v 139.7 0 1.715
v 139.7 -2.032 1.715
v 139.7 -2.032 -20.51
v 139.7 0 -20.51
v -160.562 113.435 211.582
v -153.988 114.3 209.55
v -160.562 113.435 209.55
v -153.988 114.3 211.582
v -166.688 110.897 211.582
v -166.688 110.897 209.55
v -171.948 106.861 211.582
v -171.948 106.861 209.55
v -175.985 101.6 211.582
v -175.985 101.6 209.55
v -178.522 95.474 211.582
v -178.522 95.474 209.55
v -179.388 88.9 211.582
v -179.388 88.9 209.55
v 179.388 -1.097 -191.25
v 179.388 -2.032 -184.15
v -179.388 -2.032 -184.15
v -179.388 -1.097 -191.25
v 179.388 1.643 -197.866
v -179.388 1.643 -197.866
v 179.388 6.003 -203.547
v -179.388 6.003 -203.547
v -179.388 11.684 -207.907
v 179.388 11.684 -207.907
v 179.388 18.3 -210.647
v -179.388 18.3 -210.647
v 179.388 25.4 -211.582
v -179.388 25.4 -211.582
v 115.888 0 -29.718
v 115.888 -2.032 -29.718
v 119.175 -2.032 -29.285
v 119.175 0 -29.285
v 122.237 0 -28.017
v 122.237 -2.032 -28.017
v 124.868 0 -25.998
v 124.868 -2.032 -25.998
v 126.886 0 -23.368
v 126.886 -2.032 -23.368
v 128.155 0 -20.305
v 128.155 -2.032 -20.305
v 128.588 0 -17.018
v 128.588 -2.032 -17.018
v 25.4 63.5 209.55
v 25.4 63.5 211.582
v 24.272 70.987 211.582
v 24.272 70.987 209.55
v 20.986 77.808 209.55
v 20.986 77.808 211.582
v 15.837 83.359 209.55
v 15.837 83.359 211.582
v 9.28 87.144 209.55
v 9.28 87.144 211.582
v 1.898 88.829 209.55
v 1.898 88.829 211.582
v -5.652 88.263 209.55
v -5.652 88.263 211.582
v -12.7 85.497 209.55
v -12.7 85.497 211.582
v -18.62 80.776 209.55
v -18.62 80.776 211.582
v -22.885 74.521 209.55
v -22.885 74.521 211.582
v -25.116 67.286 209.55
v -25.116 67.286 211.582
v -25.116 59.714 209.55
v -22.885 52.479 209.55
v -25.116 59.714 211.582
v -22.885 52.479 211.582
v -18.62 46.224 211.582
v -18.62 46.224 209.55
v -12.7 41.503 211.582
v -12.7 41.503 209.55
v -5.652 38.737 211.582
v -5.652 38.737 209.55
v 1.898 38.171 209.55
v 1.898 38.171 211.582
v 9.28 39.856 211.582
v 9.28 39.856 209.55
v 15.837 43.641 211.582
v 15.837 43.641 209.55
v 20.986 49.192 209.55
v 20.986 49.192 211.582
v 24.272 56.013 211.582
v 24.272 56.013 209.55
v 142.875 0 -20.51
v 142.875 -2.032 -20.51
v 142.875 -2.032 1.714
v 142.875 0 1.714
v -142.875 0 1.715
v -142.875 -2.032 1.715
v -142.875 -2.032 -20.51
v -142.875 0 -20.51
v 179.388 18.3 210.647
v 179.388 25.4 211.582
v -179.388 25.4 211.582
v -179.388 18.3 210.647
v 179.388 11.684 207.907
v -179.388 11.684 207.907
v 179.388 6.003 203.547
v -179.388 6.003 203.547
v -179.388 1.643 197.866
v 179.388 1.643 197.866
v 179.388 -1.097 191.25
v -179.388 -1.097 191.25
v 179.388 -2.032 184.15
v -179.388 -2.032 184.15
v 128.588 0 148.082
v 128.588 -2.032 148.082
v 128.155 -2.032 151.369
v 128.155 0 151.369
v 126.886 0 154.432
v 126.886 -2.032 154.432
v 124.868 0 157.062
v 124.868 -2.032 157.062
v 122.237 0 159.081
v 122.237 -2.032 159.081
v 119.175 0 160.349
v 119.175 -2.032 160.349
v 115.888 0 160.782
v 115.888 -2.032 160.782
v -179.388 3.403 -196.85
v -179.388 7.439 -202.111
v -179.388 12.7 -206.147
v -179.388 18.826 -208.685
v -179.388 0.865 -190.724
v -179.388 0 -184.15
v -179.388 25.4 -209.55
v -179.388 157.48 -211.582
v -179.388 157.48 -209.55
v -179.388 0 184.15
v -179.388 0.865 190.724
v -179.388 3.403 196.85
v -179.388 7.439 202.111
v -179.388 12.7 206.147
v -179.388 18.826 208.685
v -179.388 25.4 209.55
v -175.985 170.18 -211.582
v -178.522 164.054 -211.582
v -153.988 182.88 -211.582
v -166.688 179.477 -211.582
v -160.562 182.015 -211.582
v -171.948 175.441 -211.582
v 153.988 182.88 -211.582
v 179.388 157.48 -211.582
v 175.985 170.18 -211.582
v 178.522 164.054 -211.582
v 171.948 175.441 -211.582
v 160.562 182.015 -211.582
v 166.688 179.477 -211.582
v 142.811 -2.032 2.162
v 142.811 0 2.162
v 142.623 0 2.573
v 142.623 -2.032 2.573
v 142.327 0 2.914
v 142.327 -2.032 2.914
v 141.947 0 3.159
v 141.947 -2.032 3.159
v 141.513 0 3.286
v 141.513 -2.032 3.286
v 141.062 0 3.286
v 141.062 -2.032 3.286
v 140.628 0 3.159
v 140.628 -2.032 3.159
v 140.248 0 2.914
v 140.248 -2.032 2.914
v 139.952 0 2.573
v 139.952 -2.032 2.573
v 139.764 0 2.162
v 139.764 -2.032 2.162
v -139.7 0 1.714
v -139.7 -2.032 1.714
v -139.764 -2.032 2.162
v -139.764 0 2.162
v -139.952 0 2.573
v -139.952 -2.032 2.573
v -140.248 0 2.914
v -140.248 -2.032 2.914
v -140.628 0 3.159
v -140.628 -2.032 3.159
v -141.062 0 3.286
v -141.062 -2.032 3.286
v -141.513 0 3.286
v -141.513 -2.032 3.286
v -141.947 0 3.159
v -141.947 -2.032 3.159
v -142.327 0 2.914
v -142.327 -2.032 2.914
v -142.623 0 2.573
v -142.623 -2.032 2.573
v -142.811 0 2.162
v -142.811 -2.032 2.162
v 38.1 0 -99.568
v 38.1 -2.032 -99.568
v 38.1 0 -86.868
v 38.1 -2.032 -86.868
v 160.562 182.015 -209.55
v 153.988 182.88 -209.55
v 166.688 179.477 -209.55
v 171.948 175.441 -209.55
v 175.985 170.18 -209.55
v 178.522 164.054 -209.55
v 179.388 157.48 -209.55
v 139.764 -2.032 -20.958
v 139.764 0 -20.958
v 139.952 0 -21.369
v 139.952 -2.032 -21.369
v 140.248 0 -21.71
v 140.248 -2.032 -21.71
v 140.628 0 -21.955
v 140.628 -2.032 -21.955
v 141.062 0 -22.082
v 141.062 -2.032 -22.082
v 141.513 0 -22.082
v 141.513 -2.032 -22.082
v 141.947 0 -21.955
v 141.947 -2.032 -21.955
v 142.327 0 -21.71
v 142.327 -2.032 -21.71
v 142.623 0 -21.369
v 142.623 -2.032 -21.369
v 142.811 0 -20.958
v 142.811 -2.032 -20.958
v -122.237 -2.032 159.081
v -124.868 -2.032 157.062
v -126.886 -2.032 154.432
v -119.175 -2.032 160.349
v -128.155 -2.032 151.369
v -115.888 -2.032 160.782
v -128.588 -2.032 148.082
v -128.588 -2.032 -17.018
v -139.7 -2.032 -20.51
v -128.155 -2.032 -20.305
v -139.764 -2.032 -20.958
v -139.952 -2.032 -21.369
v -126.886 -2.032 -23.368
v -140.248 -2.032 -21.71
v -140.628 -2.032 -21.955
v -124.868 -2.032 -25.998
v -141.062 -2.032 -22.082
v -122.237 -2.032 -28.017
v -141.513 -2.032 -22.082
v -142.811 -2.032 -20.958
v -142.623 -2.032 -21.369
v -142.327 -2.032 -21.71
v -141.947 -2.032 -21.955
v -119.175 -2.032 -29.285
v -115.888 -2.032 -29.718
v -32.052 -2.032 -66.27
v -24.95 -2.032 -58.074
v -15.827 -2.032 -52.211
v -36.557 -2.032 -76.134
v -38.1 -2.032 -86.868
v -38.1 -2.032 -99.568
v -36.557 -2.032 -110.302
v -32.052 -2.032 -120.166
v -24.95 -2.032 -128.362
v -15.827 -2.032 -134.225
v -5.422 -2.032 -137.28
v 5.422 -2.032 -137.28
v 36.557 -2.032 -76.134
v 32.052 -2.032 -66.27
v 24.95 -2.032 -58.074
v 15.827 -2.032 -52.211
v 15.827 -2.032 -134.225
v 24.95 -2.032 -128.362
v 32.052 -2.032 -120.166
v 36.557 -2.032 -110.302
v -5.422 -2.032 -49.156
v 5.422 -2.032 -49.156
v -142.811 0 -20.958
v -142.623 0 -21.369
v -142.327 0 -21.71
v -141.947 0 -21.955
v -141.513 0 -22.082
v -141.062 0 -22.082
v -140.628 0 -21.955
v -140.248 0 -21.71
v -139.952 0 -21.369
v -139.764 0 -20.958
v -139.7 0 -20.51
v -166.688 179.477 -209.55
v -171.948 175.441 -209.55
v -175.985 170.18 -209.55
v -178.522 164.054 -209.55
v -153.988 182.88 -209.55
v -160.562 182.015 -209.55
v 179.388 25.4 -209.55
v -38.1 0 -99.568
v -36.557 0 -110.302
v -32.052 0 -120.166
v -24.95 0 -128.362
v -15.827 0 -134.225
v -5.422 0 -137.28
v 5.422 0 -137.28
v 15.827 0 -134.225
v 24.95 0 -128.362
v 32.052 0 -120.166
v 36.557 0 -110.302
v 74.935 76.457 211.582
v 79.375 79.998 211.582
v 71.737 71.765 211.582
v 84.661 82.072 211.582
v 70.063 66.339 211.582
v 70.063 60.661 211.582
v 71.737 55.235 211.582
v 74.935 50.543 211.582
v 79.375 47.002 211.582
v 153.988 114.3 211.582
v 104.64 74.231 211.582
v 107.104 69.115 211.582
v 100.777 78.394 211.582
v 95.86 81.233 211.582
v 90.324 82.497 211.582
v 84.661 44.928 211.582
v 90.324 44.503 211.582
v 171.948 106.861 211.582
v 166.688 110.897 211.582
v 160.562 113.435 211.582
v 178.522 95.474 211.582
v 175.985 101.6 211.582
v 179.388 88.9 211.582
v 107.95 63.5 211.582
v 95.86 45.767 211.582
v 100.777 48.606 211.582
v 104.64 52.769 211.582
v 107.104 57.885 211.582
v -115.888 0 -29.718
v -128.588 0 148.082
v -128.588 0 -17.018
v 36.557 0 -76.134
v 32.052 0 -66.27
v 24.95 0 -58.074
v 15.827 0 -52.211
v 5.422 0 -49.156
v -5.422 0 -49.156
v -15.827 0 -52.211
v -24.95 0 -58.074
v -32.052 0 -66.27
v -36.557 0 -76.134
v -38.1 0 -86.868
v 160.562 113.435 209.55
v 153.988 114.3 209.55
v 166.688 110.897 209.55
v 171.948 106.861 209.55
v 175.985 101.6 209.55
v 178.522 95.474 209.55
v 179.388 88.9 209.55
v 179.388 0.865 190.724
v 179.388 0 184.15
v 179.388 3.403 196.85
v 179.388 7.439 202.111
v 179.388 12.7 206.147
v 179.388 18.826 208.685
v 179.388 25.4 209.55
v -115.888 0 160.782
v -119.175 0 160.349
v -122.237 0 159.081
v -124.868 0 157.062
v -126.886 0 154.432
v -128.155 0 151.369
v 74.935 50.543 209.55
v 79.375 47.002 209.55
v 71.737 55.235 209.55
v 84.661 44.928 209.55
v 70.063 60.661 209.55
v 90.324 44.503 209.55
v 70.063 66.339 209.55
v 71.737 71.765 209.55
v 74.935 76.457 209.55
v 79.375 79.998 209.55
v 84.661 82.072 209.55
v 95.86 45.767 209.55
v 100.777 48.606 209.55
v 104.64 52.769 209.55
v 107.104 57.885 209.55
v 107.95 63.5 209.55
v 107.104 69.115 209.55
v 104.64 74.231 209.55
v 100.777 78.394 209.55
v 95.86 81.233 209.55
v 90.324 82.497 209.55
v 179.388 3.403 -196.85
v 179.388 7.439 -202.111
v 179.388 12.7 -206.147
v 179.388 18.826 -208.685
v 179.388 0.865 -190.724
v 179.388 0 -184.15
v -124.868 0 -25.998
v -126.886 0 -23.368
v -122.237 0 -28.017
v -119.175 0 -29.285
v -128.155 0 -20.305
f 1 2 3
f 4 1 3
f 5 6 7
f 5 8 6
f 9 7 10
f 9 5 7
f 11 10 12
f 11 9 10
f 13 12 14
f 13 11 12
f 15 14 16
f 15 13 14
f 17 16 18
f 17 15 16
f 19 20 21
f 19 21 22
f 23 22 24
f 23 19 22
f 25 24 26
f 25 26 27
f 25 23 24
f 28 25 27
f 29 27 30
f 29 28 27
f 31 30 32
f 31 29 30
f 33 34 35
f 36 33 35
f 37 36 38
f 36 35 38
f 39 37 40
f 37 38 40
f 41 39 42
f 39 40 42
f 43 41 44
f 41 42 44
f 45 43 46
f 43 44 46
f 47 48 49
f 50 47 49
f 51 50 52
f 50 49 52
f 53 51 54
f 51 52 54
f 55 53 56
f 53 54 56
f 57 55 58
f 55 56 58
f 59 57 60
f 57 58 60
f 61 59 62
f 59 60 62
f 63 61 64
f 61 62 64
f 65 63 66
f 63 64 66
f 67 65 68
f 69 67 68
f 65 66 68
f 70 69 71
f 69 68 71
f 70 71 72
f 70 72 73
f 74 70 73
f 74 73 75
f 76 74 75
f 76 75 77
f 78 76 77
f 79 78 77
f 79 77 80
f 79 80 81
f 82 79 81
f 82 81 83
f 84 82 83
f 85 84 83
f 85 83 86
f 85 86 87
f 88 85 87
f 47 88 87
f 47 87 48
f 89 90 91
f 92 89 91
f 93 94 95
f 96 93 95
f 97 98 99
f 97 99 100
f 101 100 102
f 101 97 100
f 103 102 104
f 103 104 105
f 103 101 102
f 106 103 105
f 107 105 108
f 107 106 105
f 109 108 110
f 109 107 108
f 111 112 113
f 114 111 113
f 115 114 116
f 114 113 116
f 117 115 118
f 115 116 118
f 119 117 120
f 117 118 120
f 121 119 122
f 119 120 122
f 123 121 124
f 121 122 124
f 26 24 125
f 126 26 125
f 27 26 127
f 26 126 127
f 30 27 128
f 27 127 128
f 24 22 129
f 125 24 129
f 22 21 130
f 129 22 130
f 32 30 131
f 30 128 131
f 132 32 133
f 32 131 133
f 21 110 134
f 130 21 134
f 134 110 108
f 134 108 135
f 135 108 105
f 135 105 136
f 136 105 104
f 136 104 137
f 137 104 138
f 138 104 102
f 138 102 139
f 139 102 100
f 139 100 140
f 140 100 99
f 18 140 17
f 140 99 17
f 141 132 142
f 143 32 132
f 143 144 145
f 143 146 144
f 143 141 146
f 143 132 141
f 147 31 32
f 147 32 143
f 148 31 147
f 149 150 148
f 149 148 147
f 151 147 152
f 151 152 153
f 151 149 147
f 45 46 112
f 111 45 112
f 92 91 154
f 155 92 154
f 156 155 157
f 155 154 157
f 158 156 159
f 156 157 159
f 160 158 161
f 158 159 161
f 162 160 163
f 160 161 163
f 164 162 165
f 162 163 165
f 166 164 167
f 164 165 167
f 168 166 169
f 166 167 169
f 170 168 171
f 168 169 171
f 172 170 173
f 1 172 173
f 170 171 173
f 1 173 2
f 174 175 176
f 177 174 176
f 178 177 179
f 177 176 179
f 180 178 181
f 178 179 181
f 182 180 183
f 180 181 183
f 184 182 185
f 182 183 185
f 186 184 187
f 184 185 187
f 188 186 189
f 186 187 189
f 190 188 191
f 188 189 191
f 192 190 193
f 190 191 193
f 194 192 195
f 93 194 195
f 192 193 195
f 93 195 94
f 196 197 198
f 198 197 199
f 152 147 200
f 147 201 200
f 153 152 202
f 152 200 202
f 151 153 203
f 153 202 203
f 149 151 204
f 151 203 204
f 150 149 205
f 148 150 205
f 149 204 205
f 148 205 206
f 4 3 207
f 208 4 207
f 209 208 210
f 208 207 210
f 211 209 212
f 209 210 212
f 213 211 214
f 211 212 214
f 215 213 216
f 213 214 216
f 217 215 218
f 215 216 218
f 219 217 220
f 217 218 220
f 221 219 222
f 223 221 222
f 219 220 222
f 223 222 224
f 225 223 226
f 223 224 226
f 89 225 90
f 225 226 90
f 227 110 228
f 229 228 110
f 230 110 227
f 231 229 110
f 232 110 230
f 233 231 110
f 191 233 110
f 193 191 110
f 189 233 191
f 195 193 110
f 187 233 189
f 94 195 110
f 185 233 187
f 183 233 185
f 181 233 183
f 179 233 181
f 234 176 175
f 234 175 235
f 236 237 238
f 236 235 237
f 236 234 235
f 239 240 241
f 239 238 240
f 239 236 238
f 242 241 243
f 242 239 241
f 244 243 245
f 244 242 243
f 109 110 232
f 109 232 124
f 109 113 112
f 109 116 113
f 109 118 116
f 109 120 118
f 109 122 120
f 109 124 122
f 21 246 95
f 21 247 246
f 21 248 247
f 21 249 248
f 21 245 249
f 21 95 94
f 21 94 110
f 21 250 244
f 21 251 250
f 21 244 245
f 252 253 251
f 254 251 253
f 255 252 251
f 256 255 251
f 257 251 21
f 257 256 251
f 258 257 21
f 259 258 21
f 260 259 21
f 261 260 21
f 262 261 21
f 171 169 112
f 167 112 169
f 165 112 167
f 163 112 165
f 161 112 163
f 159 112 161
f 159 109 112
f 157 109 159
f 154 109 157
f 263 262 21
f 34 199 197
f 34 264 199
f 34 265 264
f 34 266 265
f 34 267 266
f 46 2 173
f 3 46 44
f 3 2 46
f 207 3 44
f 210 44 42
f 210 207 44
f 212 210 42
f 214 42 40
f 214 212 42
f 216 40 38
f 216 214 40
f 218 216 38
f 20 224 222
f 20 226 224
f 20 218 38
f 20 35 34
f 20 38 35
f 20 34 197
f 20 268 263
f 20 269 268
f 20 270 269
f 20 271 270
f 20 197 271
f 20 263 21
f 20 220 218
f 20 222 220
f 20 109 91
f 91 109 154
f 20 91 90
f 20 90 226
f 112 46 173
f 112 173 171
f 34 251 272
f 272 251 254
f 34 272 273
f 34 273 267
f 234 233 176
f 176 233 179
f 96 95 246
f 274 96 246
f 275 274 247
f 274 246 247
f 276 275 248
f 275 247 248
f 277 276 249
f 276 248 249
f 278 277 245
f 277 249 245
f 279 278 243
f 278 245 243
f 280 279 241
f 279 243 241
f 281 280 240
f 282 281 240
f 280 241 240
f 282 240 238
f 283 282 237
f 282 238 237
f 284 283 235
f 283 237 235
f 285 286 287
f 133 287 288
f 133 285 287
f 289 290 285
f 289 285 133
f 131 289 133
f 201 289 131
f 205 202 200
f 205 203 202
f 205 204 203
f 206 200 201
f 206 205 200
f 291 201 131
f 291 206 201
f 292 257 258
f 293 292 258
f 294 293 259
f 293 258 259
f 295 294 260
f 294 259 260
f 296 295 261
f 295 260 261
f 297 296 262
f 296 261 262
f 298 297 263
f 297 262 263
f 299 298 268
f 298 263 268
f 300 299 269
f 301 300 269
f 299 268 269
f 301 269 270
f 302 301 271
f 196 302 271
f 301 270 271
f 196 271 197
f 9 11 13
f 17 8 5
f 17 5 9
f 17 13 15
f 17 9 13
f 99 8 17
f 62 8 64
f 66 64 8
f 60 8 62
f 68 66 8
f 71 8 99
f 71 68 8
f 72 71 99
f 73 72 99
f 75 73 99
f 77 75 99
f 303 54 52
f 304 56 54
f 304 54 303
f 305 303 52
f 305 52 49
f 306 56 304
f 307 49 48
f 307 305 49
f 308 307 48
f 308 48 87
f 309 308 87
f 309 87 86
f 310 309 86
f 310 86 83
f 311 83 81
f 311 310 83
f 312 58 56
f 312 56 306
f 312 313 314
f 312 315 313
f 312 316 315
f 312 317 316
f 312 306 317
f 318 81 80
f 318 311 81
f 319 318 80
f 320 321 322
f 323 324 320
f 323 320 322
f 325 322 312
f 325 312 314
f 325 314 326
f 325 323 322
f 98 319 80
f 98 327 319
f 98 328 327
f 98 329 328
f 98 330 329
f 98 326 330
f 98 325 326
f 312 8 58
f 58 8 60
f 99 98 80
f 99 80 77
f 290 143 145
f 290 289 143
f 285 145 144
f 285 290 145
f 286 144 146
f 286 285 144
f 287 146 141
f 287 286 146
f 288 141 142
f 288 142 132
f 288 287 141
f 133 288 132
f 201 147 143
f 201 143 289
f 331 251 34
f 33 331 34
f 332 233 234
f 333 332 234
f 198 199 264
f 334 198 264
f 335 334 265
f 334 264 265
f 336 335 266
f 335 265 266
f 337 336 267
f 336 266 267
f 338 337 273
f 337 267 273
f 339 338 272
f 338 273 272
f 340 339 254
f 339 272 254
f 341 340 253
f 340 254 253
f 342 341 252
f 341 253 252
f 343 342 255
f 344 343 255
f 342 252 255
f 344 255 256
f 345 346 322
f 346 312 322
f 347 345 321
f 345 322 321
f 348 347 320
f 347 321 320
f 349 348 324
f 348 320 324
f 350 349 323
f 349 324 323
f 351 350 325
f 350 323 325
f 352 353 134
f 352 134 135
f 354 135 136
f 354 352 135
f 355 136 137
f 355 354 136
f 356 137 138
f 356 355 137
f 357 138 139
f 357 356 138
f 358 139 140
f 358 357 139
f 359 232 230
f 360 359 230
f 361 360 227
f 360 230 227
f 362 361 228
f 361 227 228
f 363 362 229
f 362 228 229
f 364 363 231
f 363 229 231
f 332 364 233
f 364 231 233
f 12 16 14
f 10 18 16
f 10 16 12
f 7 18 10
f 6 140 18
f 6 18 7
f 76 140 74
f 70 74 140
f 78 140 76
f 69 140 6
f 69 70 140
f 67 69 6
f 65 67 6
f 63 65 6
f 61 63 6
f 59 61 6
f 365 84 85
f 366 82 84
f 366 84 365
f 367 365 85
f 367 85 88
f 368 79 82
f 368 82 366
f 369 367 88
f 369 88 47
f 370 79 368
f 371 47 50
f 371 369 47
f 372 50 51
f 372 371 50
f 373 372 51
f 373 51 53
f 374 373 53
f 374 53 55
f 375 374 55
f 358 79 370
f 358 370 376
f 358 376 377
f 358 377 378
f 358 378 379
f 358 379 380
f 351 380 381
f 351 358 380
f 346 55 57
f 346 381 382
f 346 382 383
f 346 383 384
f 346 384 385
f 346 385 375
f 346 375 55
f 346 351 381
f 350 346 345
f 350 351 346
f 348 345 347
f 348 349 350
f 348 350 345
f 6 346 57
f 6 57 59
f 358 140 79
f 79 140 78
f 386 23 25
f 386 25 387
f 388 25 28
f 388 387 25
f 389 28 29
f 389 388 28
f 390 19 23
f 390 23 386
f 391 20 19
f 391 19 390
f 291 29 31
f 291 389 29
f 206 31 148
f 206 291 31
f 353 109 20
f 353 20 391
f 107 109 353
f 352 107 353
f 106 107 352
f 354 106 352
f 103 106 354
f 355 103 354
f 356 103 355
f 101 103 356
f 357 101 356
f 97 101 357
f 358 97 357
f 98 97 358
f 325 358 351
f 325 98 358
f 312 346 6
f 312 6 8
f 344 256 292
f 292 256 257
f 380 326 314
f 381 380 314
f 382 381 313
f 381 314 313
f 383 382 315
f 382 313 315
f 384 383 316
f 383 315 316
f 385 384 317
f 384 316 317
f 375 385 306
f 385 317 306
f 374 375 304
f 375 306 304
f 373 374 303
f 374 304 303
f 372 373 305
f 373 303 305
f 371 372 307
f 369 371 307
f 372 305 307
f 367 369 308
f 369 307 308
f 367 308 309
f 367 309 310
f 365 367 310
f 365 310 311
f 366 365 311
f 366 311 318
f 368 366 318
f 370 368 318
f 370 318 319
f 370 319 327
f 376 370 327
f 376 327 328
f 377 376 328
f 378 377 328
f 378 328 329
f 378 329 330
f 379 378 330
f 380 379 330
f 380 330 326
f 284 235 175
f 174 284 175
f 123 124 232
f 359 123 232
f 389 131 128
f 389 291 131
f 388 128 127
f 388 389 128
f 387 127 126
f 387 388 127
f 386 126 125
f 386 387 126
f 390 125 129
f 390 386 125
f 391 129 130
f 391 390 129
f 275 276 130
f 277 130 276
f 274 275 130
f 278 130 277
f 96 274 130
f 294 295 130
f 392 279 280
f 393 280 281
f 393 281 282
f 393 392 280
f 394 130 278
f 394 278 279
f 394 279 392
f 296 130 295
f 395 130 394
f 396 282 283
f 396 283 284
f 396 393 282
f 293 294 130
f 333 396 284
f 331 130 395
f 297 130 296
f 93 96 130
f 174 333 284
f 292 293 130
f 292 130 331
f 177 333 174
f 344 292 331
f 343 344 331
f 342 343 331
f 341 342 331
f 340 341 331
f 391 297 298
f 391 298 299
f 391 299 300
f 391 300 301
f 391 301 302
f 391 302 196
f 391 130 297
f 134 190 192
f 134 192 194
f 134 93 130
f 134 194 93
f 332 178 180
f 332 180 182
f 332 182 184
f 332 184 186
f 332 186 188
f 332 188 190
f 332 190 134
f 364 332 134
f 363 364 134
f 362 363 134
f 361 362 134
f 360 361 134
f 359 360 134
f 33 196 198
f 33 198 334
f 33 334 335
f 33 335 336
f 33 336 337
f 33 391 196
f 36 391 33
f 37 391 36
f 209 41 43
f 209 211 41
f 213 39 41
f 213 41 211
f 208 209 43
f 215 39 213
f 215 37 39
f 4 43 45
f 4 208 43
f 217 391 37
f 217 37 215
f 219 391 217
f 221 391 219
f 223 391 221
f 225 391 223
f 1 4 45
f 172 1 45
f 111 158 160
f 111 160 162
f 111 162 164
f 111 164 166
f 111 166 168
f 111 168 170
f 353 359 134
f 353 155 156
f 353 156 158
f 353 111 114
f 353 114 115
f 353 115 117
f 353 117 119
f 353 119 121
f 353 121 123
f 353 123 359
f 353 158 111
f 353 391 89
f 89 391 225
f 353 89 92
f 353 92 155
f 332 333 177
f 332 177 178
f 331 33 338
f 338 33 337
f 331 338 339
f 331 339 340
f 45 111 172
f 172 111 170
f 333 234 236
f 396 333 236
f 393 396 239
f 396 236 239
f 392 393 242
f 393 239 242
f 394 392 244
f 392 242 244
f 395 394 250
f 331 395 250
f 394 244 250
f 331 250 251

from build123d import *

# Parameters (mm, degrees)
F1_DEPTH  = 179.3875
F2_R      = 25.4
F4_DEPTH  = 2.032
F6_DEPTH  = 2.032
F8_DEPTH  = 2.54
F9_R      = 25.4
F10_DEPTH = 25.4
F11_R     = 19.05
F12_DEPTH = 25.4


with BuildPart() as f1:
    # F0 (on Right) → F1 (new body, symmetric)
    with BuildSketch(Plane.YZ):
        with BuildLine():
            Line((0, -184.15), (0, 184.15))
            ThreePointArc((0, 184.15), (7.439488, 202.110512), (25.4, 209.55))
            Line((25.4, 209.55), (114.3, 209.55))
            Line((114.3, 209.55), (114.3, 211.582))
            Line((114.3, 211.582), (25.4, 211.582))
            ThreePointArc((25.4, 211.582), (6.002647, 203.547353), (-2.032, 184.15))
            Line((-2.032, 184.15), (-2.032, -184.15))
            ThreePointArc((-2.032, -184.15), (6.002647, -203.547353), (25.4, -211.582))
            Line((25.4, -211.582), (182.88, -211.582))
            Line((182.88, -211.582), (182.88, -209.55))
            Line((182.88, -209.55), (25.4, -209.55))
            ThreePointArc((25.4, -209.55), (7.439488, -202.110512), (0, -184.15))
        make_face()
    extrude(amount=F1_DEPTH, both=True)

    # F2
    f2_edges = [f1.edges().sort_by_distance(p)[0] for p in [
        (179.3875, 114.3, 210.566),
        (-179.3875, 114.3, 210.566),
        (-179.3875, 182.88, -210.566),
        (179.3875, 182.88, -210.566),
    ]]
    fillet(f2_edges, radius=F2_R)

    # F3 (on face) → F4 (cut)
    with BuildSketch(Plane.XZ.offset(2.032)):
        with BuildLine():
            Line((115.8875, 160.782), (-115.8875, 160.782))
            ThreePointArc((-115.8875, 160.782), (-124.867756, 157.062256), (-128.5875, 148.082))
            Line((-128.5875, 148.082), (-128.5875, -17.018))
            ThreePointArc((-128.5875, -17.018), (-124.867756, -25.998256), (-115.8875, -29.718))
            Line((-115.8875, -29.718), (115.8875, -29.718))
            ThreePointArc((115.8875, -29.718), (124.867756, -25.998256), (128.5875, -17.018))
            Line((128.5875, -17.018), (128.5875, 148.082))
            ThreePointArc((128.5875, 148.082), (124.867756, 157.062256), (115.8875, 160.782))
        make_face()
    extrude(amount=-F4_DEPTH, mode=Mode.SUBTRACT)

    # F5 (on face) → F6 (cut)
    with BuildSketch(Plane.XZ.offset(2.032)):
        with BuildLine():
            Line((38.1, -99.568), (38.1, -86.868))
            ThreePointArc((38.1, -86.868), (0, -48.768), (-38.1, -86.868))
            Line((-38.1, -86.868), (-38.1, -99.568))
            ThreePointArc((-38.1, -99.568), (0, -137.668), (38.1, -99.568))
        make_face()
    extrude(amount=-F6_DEPTH, mode=Mode.SUBTRACT)

    # F7 (on face) → F8 (cut)
    with BuildSketch(Plane.XZ.offset(2.032)):
        with BuildLine():
            ThreePointArc((142.875, 1.7145), (141.2875, 3.302), (139.7, 1.7145))
            Line((139.7, 1.7145), (139.7, -20.5105))
            ThreePointArc((139.7, -20.5105), (141.2875, -22.098), (142.875, -20.5105))
            Line((142.875, -20.5105), (142.875, 1.7145))
        make_face()
        with BuildLine():
            ThreePointArc((-139.7, 1.7145), (-141.2875, 3.302), (-142.875, 1.7145))
            Line((-142.875, 1.7145), (-142.875, -20.5105))
            ThreePointArc((-142.875, -20.5105), (-141.2875, -22.098), (-139.7, -20.5105))
            Line((-139.7, -20.5105), (-139.7, 1.7145))
        make_face()
    extrude(amount=-F8_DEPTH, mode=Mode.SUBTRACT)

    # F9 (on face) → F10 (cut)
    with BuildSketch(Plane.XY.offset(211.582)):
        with Locations((0, 63.5)):
            Circle(F9_R)
    extrude(amount=-F10_DEPTH, mode=Mode.SUBTRACT)

    # F11 (on face) → F12 (cut)
    with BuildSketch(Plane.XY.offset(211.582)):
        with Locations((88.9, 63.5)):
            Circle(F11_R)
    extrude(amount=-F12_DEPTH, mode=Mode.SUBTRACT)


solid = f1.part
